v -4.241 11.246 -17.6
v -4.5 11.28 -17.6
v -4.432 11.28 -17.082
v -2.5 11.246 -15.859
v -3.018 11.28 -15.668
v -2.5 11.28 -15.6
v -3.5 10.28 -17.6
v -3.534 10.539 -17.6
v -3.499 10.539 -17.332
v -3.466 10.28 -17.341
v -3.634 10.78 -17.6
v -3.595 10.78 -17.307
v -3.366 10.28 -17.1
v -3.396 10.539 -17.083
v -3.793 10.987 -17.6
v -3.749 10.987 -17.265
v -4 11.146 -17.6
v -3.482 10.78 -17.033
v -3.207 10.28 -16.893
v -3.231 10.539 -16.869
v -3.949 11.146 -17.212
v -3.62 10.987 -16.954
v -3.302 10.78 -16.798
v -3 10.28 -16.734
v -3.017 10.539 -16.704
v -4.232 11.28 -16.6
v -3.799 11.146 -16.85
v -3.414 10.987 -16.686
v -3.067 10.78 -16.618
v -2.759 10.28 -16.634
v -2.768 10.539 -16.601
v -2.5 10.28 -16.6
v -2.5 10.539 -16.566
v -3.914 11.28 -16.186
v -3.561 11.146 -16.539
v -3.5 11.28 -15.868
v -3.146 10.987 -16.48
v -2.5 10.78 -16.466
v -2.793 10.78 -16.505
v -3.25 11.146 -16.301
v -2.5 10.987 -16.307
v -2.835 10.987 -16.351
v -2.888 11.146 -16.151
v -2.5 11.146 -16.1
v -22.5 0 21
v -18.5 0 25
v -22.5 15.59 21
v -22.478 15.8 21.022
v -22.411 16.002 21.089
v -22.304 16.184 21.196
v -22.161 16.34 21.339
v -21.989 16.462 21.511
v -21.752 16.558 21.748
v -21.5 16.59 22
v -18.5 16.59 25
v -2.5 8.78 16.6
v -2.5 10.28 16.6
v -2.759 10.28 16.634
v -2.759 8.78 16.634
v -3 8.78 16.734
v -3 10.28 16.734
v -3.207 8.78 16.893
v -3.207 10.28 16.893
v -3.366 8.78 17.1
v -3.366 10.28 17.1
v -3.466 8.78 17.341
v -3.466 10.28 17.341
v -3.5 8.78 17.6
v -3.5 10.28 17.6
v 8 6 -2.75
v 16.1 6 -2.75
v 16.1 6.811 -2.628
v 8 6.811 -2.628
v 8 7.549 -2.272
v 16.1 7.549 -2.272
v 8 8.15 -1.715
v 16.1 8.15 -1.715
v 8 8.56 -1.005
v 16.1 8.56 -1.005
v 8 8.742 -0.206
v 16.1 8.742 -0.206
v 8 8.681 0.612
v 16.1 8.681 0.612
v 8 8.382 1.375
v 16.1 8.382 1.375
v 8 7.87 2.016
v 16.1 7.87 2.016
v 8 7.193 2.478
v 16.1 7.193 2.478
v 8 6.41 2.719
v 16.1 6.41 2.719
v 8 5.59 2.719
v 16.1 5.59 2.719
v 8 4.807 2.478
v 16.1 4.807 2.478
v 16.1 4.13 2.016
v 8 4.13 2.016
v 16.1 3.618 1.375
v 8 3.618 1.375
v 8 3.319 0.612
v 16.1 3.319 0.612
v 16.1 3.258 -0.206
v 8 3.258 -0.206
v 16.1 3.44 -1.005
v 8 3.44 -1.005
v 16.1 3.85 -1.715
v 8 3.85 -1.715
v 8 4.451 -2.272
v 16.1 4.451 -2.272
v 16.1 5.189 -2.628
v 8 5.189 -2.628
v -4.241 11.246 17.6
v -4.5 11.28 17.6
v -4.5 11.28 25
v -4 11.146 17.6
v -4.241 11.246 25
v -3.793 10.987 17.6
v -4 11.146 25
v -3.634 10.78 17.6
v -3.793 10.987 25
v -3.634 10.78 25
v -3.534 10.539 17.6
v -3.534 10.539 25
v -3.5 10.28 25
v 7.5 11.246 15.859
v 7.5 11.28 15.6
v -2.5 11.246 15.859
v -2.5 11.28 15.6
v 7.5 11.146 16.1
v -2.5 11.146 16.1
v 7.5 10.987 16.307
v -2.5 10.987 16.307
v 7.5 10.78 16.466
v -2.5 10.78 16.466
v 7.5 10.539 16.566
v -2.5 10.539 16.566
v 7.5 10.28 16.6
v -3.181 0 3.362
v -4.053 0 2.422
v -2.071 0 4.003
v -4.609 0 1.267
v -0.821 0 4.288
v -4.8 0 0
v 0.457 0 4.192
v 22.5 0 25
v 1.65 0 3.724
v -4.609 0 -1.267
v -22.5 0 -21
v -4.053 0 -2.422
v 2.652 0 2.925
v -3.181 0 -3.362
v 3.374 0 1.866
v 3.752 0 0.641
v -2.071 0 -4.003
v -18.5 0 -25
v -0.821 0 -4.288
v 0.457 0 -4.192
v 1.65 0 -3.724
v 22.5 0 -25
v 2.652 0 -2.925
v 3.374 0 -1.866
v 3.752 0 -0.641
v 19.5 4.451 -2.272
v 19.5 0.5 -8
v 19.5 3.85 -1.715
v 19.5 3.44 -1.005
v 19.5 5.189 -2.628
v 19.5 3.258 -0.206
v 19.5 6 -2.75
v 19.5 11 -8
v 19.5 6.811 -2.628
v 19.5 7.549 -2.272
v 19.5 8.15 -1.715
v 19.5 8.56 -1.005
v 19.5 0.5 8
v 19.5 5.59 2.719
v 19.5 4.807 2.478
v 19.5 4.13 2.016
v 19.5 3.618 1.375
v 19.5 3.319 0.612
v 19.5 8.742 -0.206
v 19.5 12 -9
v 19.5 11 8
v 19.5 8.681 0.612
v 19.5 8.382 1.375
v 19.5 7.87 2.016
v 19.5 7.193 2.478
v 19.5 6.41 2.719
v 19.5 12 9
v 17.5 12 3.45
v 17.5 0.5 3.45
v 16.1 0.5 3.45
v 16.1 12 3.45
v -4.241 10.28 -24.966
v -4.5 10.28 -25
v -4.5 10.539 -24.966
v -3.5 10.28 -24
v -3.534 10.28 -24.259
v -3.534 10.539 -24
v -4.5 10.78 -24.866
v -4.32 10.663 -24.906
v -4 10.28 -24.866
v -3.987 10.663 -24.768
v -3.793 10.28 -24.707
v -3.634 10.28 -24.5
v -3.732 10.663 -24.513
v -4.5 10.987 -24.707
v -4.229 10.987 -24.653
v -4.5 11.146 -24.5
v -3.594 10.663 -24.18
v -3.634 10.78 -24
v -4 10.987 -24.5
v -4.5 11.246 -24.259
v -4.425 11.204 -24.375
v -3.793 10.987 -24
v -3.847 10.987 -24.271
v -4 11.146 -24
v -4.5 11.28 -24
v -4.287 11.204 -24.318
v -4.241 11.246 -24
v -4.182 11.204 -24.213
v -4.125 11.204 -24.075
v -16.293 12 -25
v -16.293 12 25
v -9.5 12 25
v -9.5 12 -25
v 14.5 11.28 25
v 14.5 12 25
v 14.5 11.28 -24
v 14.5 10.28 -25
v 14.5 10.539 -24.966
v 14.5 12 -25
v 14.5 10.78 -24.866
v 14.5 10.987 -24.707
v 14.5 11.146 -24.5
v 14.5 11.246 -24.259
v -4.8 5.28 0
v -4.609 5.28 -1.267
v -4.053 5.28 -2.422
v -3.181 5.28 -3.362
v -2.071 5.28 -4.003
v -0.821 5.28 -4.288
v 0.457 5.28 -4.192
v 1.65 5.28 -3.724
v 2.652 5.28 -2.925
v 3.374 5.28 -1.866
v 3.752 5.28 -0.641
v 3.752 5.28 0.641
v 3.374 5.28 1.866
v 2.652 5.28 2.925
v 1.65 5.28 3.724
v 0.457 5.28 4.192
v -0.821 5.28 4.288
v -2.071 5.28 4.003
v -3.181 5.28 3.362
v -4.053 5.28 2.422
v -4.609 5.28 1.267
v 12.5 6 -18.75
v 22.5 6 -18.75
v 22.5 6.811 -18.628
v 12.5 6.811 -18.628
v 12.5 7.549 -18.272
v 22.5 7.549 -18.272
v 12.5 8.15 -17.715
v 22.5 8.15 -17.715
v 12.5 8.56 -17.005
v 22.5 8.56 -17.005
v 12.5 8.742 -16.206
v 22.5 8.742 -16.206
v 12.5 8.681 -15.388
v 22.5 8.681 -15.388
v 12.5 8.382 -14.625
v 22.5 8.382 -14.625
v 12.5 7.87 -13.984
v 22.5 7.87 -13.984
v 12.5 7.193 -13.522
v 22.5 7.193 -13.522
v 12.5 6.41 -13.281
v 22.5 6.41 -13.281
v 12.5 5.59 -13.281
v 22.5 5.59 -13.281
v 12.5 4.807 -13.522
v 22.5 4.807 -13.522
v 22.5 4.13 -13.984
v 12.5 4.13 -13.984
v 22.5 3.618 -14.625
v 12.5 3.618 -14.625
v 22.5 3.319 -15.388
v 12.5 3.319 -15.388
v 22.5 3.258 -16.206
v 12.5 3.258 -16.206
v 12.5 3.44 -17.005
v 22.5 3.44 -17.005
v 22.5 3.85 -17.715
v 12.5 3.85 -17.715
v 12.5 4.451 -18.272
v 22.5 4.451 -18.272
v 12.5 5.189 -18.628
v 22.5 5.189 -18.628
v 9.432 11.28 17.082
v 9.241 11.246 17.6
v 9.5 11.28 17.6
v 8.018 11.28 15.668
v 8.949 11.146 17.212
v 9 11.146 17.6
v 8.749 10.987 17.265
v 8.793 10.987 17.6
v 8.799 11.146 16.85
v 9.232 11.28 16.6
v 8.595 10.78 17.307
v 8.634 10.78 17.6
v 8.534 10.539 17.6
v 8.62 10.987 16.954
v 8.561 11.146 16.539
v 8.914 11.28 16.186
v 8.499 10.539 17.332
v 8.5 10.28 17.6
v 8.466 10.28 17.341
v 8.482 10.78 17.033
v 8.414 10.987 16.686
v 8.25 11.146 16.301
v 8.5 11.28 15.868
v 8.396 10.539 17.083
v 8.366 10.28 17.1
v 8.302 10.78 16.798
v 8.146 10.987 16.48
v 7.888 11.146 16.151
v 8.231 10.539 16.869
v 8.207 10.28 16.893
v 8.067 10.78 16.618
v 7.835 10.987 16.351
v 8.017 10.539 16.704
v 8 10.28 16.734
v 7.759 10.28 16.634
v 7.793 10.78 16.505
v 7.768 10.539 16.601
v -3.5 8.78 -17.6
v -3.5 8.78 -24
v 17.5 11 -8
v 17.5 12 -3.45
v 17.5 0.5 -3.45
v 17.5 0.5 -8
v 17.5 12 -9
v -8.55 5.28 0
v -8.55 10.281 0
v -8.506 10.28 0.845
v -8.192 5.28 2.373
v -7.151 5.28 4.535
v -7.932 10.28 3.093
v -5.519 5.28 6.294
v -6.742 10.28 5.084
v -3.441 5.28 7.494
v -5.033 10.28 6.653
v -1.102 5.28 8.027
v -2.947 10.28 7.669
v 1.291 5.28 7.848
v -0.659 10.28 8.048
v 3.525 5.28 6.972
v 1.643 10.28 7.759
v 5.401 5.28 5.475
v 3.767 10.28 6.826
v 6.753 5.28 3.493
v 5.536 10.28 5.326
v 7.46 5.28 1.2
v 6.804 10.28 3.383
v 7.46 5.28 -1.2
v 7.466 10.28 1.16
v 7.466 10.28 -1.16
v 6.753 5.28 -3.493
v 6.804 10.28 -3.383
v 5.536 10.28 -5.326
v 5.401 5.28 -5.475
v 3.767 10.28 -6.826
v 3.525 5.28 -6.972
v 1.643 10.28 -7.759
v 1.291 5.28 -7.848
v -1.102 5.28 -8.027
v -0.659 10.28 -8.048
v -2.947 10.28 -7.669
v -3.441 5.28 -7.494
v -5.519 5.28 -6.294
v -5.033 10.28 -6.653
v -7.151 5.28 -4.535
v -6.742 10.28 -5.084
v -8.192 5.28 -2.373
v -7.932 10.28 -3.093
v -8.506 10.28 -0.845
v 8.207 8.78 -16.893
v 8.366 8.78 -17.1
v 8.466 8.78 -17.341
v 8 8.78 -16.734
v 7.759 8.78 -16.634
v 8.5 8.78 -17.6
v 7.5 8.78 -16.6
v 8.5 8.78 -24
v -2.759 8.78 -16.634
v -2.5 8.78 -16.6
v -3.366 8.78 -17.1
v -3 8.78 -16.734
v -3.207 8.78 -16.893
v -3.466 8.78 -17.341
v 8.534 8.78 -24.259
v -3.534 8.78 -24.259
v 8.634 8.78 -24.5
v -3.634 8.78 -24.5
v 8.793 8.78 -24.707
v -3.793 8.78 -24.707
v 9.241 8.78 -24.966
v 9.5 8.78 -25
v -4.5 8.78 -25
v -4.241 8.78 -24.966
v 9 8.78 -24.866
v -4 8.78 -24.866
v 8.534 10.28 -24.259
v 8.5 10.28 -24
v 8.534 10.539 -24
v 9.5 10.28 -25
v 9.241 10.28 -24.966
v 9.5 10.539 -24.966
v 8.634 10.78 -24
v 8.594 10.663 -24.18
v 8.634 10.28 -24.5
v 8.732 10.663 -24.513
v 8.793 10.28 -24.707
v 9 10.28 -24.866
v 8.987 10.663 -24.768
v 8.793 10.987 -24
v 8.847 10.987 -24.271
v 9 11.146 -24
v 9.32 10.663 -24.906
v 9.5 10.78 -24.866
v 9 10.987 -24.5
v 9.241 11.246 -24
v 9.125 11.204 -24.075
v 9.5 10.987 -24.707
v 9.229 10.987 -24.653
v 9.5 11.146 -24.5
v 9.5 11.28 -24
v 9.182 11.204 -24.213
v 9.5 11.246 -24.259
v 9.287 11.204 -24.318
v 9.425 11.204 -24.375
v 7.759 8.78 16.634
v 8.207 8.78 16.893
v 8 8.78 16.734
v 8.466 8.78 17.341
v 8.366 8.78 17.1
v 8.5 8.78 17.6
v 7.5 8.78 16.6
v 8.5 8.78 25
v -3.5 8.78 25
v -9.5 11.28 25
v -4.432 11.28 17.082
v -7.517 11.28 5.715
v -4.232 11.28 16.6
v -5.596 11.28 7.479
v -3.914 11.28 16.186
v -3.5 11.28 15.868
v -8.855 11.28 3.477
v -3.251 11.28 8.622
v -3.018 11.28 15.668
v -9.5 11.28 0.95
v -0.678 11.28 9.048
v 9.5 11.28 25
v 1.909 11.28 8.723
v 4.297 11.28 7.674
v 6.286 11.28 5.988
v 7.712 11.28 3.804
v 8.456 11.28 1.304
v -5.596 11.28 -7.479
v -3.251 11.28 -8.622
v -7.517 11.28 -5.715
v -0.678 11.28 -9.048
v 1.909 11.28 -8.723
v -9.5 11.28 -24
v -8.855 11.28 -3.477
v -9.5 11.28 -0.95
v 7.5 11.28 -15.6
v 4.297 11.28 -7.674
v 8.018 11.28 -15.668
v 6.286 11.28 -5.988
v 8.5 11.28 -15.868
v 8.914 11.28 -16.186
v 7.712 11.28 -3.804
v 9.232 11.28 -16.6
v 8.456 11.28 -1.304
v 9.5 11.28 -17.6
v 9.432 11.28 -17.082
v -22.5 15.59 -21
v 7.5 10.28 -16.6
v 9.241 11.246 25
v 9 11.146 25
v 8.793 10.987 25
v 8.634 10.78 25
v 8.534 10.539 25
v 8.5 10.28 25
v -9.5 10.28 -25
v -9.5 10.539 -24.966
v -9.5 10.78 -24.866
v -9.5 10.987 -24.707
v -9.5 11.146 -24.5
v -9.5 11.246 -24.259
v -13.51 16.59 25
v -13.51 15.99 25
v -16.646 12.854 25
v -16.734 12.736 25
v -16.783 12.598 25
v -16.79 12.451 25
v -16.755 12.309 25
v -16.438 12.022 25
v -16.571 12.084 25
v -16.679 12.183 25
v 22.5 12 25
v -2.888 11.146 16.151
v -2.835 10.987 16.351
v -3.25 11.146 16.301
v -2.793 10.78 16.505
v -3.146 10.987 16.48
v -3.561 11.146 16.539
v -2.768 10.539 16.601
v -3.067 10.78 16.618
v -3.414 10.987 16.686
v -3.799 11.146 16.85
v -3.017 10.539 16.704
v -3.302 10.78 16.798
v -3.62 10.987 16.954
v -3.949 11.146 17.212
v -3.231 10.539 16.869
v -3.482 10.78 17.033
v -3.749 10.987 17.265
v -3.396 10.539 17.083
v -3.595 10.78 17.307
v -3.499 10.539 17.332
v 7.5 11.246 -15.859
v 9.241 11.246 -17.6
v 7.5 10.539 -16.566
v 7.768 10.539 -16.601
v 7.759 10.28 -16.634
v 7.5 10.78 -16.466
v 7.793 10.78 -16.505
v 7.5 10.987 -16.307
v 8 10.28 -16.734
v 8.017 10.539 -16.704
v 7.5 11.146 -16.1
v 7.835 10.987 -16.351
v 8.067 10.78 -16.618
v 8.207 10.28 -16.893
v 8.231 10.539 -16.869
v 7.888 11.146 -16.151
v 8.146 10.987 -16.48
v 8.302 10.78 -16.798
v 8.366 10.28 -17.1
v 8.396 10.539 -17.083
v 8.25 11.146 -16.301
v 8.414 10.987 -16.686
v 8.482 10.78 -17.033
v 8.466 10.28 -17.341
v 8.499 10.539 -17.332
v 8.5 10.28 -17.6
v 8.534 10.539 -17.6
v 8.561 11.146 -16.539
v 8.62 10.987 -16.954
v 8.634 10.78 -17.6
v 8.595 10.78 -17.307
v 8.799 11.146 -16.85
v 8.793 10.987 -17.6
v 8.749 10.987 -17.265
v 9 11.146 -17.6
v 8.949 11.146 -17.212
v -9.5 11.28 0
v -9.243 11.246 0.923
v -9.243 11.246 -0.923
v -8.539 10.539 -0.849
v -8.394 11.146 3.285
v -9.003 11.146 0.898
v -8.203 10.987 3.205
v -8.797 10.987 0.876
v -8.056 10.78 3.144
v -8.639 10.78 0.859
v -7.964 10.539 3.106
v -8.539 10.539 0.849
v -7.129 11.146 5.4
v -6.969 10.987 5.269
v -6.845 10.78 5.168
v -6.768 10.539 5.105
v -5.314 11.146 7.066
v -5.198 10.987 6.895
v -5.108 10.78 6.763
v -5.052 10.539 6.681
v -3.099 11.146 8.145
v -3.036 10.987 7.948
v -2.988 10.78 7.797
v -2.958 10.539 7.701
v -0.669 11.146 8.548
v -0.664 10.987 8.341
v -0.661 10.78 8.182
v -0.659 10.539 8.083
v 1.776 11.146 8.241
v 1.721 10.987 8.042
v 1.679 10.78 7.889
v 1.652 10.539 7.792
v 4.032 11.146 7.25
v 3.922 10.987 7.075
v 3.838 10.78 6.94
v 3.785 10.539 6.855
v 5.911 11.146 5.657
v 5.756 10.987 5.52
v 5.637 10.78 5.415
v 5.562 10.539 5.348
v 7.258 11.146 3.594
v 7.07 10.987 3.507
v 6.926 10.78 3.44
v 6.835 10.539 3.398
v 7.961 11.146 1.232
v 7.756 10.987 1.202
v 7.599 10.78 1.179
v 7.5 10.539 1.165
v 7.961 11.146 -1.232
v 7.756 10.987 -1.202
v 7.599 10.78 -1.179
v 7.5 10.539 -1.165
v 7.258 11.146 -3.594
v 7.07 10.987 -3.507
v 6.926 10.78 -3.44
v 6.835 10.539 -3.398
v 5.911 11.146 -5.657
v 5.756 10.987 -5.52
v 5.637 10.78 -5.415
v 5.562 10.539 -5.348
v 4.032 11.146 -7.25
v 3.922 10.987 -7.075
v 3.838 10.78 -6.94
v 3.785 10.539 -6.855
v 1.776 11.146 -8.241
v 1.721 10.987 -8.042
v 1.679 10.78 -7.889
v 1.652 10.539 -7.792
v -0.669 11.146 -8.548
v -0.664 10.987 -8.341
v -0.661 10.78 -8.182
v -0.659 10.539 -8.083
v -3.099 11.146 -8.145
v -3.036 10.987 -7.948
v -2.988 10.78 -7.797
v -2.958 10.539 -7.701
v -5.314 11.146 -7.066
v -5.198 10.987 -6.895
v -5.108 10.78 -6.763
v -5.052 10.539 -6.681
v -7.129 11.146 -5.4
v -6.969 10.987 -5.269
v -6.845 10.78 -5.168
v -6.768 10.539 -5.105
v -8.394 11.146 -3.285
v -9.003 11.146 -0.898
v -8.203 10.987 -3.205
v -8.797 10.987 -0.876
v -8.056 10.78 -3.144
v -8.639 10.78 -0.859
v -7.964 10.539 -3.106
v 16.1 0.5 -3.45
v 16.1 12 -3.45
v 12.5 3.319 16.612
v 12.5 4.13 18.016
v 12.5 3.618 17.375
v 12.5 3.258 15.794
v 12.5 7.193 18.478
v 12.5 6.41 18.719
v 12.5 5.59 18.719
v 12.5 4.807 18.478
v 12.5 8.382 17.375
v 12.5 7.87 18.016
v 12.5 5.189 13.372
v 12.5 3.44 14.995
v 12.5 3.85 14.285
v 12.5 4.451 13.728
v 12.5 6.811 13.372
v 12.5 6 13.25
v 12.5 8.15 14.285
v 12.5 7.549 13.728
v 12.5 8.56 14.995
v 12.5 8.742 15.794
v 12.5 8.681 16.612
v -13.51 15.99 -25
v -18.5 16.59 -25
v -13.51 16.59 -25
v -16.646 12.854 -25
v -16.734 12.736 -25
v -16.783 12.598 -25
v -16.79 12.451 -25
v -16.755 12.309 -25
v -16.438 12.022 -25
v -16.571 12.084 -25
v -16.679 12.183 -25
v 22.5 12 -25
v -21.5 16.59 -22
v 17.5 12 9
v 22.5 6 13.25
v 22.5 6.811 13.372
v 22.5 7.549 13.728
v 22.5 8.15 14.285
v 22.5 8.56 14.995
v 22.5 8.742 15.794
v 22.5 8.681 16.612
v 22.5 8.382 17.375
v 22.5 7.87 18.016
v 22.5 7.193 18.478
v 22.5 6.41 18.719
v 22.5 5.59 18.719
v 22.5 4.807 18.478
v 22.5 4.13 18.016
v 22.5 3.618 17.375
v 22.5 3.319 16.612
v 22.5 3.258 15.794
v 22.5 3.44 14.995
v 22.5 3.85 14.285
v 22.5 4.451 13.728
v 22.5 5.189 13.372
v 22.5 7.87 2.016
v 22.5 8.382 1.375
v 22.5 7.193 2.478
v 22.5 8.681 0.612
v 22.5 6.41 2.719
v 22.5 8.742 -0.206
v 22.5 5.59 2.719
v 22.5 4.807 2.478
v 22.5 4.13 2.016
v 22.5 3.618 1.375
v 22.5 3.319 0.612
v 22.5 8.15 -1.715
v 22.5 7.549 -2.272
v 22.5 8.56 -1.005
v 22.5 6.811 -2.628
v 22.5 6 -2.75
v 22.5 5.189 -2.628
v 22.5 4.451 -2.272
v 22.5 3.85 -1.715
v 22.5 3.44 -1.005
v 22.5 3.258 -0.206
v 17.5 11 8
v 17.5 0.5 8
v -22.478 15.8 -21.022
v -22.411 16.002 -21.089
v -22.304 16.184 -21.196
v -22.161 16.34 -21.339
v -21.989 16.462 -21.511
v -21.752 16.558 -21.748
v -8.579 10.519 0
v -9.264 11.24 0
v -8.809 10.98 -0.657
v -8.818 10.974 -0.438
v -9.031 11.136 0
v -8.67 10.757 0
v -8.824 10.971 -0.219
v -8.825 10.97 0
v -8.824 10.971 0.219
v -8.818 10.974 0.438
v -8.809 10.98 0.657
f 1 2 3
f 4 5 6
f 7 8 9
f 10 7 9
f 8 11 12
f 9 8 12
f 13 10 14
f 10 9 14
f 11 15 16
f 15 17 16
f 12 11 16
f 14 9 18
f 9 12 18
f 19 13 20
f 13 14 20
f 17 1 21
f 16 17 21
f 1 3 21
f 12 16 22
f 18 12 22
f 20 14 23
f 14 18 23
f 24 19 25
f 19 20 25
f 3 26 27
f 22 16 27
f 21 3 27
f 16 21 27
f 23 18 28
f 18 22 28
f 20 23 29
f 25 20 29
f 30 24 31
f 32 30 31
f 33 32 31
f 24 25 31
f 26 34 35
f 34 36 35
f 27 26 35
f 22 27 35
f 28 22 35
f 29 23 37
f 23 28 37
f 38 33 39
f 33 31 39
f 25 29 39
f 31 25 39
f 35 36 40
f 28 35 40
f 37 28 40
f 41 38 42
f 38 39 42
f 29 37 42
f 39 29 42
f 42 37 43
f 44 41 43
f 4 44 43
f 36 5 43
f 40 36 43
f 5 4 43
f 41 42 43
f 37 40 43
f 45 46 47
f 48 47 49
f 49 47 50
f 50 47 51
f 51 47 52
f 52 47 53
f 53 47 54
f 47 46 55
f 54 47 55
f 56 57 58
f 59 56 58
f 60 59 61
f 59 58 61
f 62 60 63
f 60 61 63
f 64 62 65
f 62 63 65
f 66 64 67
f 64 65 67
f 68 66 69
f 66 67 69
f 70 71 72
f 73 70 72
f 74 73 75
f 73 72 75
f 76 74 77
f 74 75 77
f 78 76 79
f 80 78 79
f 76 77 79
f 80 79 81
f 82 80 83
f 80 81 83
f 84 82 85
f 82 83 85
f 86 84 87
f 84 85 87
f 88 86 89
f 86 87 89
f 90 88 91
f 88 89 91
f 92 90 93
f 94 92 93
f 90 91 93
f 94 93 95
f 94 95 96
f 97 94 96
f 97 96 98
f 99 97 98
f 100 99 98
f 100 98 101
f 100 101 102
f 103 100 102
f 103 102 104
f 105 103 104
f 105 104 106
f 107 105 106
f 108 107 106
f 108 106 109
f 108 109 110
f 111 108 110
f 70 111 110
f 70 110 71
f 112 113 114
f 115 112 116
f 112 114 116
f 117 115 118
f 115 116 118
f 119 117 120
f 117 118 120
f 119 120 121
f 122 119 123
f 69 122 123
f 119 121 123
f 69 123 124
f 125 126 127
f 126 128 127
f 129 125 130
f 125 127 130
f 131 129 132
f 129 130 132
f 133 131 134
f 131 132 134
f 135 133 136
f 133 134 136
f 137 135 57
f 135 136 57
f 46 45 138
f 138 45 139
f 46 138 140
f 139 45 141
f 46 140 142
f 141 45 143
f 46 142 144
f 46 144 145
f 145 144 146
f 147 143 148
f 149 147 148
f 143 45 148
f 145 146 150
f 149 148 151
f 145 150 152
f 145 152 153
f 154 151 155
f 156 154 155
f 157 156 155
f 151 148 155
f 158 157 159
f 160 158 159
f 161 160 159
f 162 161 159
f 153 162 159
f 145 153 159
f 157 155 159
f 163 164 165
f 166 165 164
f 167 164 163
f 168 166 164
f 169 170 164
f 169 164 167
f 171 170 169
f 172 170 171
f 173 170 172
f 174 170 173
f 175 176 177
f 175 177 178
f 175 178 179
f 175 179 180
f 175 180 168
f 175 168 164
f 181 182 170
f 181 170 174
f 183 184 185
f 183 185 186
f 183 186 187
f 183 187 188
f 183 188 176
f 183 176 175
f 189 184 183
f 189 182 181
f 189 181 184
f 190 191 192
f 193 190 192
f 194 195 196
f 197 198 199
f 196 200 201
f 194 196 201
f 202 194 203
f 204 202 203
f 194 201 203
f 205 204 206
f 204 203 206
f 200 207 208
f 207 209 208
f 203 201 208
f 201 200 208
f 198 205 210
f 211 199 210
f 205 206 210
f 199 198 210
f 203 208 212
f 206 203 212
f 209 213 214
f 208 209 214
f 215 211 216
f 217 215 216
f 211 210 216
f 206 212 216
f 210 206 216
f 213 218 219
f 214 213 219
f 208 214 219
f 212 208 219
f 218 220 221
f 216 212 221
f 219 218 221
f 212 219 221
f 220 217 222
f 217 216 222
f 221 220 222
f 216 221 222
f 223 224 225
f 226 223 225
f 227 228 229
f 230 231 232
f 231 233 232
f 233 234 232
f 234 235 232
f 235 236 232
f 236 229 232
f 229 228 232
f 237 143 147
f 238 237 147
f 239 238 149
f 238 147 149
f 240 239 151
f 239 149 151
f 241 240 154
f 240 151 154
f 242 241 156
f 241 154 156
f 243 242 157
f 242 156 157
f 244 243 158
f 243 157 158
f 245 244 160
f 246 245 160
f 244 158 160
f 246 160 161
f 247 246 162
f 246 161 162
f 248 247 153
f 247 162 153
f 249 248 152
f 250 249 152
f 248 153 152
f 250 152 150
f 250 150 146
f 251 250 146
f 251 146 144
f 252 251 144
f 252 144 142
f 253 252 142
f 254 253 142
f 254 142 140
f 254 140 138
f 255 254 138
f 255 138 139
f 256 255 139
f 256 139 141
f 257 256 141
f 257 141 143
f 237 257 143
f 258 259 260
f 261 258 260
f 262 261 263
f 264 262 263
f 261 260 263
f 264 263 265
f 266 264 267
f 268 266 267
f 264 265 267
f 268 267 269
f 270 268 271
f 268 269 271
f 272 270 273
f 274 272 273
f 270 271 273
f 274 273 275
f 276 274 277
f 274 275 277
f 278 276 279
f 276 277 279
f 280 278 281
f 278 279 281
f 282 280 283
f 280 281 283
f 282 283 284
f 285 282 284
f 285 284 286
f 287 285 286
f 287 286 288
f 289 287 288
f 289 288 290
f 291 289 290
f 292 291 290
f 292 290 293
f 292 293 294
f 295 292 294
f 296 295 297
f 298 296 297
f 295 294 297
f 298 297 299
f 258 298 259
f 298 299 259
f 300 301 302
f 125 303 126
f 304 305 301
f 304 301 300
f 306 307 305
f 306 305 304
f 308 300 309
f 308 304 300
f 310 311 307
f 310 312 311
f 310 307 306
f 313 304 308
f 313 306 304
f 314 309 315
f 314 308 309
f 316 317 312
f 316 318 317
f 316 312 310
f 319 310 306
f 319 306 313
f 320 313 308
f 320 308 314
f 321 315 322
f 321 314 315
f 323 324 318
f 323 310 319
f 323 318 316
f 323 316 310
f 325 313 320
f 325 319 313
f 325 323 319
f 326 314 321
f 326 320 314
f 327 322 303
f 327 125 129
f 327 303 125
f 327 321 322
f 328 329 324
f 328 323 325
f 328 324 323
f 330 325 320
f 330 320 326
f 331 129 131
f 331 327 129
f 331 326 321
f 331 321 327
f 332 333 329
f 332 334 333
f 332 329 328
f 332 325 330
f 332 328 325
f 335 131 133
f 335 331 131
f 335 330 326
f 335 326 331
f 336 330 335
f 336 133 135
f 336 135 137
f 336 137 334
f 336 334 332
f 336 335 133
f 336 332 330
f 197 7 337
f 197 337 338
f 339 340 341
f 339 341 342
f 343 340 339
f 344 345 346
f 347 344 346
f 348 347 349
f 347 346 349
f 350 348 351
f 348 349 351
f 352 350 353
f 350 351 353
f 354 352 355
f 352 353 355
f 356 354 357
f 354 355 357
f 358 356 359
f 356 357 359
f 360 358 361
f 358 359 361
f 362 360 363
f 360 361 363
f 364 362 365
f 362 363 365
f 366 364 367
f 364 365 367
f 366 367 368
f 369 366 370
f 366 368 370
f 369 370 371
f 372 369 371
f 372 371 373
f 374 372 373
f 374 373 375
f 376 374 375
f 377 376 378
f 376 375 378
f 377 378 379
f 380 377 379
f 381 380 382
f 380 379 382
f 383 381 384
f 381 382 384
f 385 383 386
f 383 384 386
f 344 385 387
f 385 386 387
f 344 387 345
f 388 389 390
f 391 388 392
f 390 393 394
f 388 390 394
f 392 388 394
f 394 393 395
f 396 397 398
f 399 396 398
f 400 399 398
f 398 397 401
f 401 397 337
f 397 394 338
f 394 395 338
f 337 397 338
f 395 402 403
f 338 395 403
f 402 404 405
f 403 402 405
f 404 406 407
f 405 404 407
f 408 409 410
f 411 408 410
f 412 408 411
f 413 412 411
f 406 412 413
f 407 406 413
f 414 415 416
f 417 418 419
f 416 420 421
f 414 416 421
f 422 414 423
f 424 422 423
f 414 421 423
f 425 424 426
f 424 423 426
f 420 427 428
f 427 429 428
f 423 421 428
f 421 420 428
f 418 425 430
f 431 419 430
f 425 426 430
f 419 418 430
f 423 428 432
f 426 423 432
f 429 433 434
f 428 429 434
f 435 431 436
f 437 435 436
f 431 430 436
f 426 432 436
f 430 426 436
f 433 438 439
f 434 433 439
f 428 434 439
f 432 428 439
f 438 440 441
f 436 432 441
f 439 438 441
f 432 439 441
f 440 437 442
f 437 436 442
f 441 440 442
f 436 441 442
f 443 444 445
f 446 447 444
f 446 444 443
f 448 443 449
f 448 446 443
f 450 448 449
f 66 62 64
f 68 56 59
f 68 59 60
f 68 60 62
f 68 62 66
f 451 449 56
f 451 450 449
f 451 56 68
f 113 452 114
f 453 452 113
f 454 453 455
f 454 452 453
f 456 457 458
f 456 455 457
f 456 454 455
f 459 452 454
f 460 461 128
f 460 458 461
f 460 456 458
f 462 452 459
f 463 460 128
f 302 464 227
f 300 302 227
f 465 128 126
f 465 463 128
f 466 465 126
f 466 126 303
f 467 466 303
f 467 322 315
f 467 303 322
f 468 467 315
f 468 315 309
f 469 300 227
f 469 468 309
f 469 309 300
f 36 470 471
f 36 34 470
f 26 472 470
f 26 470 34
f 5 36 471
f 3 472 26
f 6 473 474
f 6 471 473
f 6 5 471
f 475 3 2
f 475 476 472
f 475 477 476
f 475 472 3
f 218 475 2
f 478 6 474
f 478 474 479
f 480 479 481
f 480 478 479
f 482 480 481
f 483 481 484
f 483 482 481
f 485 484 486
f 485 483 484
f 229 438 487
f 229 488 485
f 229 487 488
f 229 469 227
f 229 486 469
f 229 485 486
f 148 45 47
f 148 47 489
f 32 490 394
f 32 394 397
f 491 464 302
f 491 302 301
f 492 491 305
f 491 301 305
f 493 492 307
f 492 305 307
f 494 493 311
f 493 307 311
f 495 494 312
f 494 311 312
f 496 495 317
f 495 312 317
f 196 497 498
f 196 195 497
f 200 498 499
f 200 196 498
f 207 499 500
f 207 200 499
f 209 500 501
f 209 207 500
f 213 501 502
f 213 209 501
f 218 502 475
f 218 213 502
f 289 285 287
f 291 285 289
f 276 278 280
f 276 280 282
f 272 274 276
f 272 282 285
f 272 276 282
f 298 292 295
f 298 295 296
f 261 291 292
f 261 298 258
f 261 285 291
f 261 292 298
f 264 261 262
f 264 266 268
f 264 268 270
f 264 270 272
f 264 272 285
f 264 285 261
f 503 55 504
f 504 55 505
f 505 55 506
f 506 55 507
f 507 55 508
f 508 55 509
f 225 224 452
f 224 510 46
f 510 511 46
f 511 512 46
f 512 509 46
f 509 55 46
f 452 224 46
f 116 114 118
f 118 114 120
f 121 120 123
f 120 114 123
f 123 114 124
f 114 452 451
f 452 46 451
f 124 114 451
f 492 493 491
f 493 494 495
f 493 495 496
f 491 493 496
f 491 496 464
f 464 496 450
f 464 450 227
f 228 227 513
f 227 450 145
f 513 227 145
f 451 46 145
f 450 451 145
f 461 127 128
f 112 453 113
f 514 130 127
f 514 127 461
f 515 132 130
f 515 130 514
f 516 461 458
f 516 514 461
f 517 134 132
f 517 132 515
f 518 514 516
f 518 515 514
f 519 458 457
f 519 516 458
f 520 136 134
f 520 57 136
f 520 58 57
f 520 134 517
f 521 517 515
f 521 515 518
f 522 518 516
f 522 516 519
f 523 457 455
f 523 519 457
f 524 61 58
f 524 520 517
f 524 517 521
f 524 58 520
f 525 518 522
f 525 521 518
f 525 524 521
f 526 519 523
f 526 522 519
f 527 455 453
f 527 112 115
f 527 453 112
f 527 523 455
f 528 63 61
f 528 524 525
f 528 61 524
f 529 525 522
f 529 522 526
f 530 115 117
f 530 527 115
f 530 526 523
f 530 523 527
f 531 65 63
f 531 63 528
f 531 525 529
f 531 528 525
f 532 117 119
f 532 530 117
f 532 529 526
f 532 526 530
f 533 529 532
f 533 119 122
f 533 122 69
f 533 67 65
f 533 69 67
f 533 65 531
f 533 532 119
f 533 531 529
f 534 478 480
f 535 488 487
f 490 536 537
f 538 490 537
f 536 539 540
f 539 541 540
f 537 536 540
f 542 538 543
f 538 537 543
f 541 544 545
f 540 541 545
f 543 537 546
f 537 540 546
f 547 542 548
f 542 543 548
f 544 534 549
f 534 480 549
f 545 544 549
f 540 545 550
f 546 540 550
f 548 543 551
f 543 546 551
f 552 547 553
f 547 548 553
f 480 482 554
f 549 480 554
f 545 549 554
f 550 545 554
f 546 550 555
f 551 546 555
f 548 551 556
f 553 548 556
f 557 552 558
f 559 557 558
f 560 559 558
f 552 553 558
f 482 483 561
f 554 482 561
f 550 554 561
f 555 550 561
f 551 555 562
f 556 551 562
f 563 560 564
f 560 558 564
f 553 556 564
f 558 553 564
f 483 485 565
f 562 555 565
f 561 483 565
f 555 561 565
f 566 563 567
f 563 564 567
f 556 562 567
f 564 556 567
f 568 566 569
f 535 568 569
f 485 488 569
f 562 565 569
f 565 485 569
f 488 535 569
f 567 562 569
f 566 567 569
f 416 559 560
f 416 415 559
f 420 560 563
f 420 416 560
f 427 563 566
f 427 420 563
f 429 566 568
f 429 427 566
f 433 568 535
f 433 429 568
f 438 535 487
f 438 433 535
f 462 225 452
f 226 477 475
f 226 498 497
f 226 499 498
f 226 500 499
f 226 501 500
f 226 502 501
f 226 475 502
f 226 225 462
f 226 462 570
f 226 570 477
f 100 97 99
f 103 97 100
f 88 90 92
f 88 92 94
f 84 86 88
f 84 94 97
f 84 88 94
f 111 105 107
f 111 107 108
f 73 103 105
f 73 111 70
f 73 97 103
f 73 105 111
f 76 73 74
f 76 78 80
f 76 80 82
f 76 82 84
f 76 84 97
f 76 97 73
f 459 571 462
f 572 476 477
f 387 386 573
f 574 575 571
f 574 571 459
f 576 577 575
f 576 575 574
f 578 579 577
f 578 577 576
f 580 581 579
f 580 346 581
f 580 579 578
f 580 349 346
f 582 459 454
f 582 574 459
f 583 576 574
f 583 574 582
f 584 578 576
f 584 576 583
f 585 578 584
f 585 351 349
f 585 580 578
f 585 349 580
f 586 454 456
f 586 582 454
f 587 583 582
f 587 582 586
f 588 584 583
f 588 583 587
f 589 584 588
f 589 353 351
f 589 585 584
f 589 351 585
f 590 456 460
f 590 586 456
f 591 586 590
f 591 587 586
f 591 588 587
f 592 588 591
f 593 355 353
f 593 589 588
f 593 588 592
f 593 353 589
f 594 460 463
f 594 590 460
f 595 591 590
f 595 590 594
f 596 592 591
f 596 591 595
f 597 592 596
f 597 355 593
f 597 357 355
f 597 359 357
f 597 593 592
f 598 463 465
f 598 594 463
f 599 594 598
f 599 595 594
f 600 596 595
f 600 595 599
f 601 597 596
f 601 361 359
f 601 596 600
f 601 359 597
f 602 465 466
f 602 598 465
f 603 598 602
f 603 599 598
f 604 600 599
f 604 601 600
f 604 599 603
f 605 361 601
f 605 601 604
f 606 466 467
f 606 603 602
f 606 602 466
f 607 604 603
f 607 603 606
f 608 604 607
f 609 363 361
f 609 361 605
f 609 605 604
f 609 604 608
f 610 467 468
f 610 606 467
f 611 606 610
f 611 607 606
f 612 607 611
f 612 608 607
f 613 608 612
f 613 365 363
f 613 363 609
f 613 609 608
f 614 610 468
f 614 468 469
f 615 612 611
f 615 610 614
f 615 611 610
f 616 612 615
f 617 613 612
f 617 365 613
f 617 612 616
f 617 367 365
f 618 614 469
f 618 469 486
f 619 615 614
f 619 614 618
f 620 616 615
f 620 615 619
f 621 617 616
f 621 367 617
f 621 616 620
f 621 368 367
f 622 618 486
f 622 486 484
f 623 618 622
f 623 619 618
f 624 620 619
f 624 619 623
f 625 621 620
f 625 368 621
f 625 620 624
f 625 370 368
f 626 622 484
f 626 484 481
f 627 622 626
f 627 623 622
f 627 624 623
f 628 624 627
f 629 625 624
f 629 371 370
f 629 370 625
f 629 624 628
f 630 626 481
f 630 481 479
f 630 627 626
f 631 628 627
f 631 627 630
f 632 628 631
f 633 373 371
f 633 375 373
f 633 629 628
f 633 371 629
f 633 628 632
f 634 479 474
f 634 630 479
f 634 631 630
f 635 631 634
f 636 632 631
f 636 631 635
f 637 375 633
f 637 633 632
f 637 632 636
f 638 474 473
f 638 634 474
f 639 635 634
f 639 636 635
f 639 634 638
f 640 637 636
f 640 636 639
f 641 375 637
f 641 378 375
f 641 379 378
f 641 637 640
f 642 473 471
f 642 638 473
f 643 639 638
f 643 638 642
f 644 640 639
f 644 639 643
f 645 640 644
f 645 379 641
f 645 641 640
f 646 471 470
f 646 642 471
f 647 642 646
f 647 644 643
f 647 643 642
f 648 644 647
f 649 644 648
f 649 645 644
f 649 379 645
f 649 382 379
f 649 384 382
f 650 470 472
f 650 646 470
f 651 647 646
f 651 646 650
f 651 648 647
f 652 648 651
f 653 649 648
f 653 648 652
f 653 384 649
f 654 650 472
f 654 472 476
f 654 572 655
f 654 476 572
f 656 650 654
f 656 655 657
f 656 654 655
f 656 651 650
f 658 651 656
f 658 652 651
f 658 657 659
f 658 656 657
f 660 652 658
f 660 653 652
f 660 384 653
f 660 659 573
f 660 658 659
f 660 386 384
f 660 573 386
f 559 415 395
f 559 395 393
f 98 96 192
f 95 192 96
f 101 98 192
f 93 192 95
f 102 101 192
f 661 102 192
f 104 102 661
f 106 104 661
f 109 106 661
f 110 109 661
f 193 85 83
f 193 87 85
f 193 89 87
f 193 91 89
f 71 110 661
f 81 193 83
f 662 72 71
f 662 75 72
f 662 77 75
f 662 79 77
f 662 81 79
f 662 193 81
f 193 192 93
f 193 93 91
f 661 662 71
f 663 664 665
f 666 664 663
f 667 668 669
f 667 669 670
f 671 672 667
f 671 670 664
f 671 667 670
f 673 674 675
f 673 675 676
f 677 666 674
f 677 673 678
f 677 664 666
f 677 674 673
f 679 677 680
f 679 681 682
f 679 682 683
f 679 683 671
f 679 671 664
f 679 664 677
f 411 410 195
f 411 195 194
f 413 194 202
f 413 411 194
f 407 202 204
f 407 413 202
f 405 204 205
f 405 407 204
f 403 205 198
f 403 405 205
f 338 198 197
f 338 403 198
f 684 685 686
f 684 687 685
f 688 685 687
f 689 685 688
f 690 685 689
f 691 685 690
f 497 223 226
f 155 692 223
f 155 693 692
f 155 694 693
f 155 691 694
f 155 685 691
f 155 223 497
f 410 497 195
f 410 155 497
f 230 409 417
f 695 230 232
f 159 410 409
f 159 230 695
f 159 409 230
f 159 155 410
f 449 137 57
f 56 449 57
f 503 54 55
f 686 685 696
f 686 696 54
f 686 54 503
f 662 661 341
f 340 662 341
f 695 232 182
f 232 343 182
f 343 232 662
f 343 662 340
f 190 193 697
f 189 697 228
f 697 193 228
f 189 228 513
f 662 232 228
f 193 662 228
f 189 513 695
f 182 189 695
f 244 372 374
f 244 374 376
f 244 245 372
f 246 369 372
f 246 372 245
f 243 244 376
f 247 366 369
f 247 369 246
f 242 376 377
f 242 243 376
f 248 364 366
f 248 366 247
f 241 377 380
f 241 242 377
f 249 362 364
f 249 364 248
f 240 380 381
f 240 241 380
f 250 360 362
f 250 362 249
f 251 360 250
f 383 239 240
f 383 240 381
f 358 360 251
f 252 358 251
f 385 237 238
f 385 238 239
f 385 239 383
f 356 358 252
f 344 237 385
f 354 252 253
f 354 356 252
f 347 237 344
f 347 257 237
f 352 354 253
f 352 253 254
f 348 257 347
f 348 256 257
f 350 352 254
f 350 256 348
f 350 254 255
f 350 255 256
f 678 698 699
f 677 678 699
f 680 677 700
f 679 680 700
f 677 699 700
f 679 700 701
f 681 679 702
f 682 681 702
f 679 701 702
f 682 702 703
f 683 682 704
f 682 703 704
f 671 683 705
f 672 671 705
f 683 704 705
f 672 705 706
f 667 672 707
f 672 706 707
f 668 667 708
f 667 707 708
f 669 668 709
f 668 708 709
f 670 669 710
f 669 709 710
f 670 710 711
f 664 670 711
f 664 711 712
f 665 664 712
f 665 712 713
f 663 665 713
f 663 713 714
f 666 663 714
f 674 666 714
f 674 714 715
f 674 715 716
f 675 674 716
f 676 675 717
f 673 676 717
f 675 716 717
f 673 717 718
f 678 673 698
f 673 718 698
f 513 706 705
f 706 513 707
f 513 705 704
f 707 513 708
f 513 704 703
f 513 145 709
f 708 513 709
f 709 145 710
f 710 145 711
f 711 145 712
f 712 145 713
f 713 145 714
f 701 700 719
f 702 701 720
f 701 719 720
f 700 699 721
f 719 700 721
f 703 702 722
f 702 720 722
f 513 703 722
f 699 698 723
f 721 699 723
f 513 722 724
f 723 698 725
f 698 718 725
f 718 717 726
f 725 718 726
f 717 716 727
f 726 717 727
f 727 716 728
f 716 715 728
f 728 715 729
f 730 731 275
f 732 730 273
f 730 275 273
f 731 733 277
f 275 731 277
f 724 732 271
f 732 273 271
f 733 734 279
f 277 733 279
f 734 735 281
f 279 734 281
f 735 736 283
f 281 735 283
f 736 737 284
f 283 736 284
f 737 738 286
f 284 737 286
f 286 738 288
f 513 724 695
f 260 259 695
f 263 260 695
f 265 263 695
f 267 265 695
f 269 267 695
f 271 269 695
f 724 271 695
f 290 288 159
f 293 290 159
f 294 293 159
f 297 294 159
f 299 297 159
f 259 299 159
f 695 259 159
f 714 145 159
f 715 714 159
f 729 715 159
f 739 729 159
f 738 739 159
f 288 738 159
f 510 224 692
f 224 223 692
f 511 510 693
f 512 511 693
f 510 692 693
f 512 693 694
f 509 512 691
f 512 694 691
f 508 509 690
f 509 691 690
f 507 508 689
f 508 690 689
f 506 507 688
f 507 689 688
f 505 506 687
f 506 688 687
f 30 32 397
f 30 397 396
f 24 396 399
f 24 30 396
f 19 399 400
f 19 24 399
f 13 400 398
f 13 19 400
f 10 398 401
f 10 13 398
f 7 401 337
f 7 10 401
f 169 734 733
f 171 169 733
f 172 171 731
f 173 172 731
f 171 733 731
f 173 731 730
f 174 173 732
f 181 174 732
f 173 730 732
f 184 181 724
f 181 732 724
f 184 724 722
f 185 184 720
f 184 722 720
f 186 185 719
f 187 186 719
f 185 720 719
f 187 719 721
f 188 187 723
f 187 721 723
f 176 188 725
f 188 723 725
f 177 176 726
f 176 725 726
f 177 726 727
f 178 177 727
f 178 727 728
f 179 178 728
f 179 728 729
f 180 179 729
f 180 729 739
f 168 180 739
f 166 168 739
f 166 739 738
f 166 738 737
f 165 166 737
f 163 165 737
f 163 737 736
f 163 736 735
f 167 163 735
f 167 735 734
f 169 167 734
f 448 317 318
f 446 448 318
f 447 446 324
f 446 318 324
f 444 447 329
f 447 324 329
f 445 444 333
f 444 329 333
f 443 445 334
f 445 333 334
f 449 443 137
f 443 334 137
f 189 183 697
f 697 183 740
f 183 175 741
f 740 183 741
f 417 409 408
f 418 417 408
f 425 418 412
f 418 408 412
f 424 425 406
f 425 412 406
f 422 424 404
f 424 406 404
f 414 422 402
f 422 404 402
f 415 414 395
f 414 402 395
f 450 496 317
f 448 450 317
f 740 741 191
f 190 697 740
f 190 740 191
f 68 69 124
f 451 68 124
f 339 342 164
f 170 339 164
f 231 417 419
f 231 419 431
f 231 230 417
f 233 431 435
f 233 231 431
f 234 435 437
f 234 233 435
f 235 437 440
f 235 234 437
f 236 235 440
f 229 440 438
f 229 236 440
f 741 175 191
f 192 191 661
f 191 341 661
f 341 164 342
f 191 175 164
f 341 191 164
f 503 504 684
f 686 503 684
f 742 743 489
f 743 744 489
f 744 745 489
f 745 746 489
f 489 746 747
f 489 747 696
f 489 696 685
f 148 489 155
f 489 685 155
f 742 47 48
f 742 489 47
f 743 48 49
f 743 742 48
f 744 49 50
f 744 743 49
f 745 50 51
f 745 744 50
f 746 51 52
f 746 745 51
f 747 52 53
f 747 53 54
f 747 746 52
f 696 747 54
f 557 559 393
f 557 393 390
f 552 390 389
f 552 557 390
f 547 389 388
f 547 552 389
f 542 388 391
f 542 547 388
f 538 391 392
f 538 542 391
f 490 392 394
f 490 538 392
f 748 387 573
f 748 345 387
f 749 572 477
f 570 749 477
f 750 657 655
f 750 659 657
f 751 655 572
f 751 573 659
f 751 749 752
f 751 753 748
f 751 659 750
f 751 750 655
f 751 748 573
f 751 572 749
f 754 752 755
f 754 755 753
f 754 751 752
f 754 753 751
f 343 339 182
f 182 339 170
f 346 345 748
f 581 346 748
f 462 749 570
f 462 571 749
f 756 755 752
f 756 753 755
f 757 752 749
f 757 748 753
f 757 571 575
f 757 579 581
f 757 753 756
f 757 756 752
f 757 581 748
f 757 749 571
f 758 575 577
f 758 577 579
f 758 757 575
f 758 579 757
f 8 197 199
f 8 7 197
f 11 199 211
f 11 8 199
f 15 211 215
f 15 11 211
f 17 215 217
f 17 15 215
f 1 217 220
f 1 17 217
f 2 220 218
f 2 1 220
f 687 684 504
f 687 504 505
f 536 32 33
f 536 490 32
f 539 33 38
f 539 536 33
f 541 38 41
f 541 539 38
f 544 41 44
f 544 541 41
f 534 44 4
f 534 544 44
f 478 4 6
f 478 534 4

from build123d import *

# Parameters (mm, degrees)
SKETCH1_W            = 45
SKETCH1_H            = 50
BOSS_EXTRUDE1_DEPTH  = 16
CUT_EXTRUDE1_DEPTH   = 58.116109812
SKETCH4_W            = 24
SKETCH4_H            = 50
CUT_EXTRUDE2_DEPTH   = 0.72
CUT_EXTRUDE3_DEPTH   = 58.116109812
SKETCH8_R            = 8.05
CUT_EXTRUDE4_DEPTH   = 6
M8_CLEARANCE_HOLE1_D = 8.6
CUT_EXTRUDE5_DEPTH   = 2.5
FILLET1_R            = 1
FILLET2_R            = 1
FILLET4_R            = 0.5
CUT_EXTRUDE7_DEPTH   = 11.5
SKETCH18_R           = 2.75
CUT_EXTRUDE8_DEPTH   = 14.5
SKETCH19_R           = 2.75
CUT_EXTRUDE9_DEPTH   = 10
SKETCH21_W           = 8.99
SKETCH21_H           = 50
BOSS_EXTRUDE2_DEPTH  = 0.6
CHAMFER1_SIZE        = 4
FILLET5_R            = 1
CHAMFER2_SIZE        = 1


with BuildPart() as part:
    # Sketch1 → Boss-Extrude1 (new body)
    with BuildSketch(Plane(origin=(0, 0, 0), x_dir=(1, 0, 0), z_dir=(0, 1, 0))):
        Rectangle(SKETCH1_W, SKETCH1_H)
    extrude(amount=BOSS_EXTRUDE1_DEPTH)

    # Sketch3 → Cut-Extrude1 (cut, through all)
    with BuildSketch(Plane.XY.offset(25)):
        Polygon((-13.5, 16), (-17.5, 12), (22.5, 12), (22.5, 16), align=None)
    extrude(amount=-CUT_EXTRUDE1_DEPTH, mode=Mode.SUBTRACT)

    # Sketch4 → Cut-Extrude2 (cut)
    with BuildSketch(Plane(origin=(0, 12, 0), x_dir=(1, 0, 0), z_dir=(0, 1, 0))):
        with Locations((2.5, 0)):
            Rectangle(SKETCH4_W, SKETCH4_H)
    extrude(amount=-CUT_EXTRUDE2_DEPTH, mode=Mode.SUBTRACT)

    # Sketch5 → Cut-Extrude3 (cut, through all)
    with BuildSketch(Plane.XY.offset(25)):
        Polygon((-22.5, 16), (-13.5, 16), (-13.51, 15.99), (-22.5, 15.99), align=None)
    extrude(amount=-CUT_EXTRUDE3_DEPTH, mode=Mode.SUBTRACT)

    # Sketch8 → Cut-Extrude4 (cut)
    with BuildSketch(Plane(origin=(0, 11.28, 0), x_dir=(1, 0, 0), z_dir=(0, 1, 0))):
        with Locations(Location((-0.5, 0, 0), (0, 0, 180))):
            Circle(SKETCH8_R)
    extrude(amount=-CUT_EXTRUDE4_DEPTH, mode=Mode.SUBTRACT)

    # M8 Clearance Hole1 (through all)
    with Locations(Plane(origin=(0, 5.28, 0), x_dir=(1, 0, 0), z_dir=(0, 1, 0))):
        with Locations((-0.5, 0)):
            Hole(M8_CLEARANCE_HOLE1_D / 2)

    # Sketch12 → Cut-Extrude5 (cut)
    with BuildSketch(Plane(origin=(0, 11.28, 0), x_dir=(1, 0, 0), z_dir=(0, 1, 0))):
        with BuildLine():
            Line((7.5, 16.6), (-2.5, 16.6))
            ThreePointArc((-2.5, 16.6), (-3.207106781, 16.892893219), (-3.5, 17.6))
            Line((-3.5, 17.6), (-3.5, 25))
            Line((-3.5, 25), (8.5, 25))
            Line((8.5, 25), (8.5, 17.6))
            ThreePointArc((8.5, 17.6), (8.207106781, 16.892893219), (7.5, 16.6))
        make_face()
    cut_extrude5 = extrude(amount=-CUT_EXTRUDE5_DEPTH, mode=Mode.SUBTRACT)

    # Fillet1
    fillet1_edges = [part.edges().sort_by_distance(p)[0] for p in [
        (-3.5, 10.03, -25),
        (8.5, 10.03, -25),
    ]]
    fillet(fillet1_edges, radius=FILLET1_R)

    # Mirror2: Cut-Extrude5 across plane
    add(cut_extrude5.mirror(Plane.XY), mode=Mode.SUBTRACT)

    # Fillet2
    fillet2_edges = [part.edges().sort_by_distance(p)[0] for p in [
        (8.207106781, 11.28, 16.892893219),
        (8.5, 11.28, 21.3),
        (-3.5, 11.28, 21.3),
        (-3.207106781, 11.28, 16.892893219),
        (2.5, 11.28, 16.6),
        (-7, 11.28, -25),
        (7.55, 11.28, 0),
        (8.207106781, 11.28, -16.892893219),
        (8.5, 11.28, -20.8),
        (-3.207106781, 11.28, -16.892893219),
        (2.5, 11.28, -16.6),
        (12, 11.28, -25),
        (-3.5, 11.28, -20.8),
        (-3.792893219, 11.28, -24.707106781),
        (8.792893219, 11.28, -24.707106781),
    ]]
    fillet(fillet2_edges, radius=FILLET2_R)

    # Fillet4
    fillet4_edges = [part.edges().sort_by_distance(p)[0] for p in [
        (-17.5, 12, 0),
    ]]
    fillet(fillet4_edges, radius=FILLET4_R)

    # Sketch14 → Cut-Extrude7 (cut)
    with BuildSketch(Plane(origin=(0, 12, 0), x_dir=(1, 0, 0), z_dir=(0, 1, 0))):
        Polygon((19.5, -8), (17.5, -8), (17.5, -3.45), (16.1, -3.45), (16.1, 3.45), (17.5, 3.45), (17.5, 8), (19.5, 8), align=None)
    extrude(amount=-CUT_EXTRUDE7_DEPTH, mode=Mode.SUBTRACT)

    # Sketch18 → Cut-Extrude8 (cut)
    with BuildSketch(Plane(origin=(22.5, 0, 0), x_dir=(0, 0, -1), z_dir=(1, 0, 0))):
        with Locations((0, 6)):
            Circle(SKETCH18_R)
    extrude(amount=-CUT_EXTRUDE8_DEPTH, mode=Mode.SUBTRACT)

    # Sketch19 → Cut-Extrude9 (cut)
    with BuildSketch(Plane(origin=(22.5, 0, 0), x_dir=(0, 0, -1), z_dir=(1, 0, 0))):
        with Locations((-16, 6)):
            Circle(SKETCH19_R)
        with Locations((16, 6)):
            Circle(SKETCH19_R)
    extrude(amount=-CUT_EXTRUDE9_DEPTH, mode=Mode.SUBTRACT)

    # Sketch21 → Boss-Extrude2 (add)
    with BuildSketch(Plane(origin=(0, 15.99, 0), x_dir=(1, 0, 0), z_dir=(0, 1, 0))):
        with Locations((-18.005, 0)):
            Rectangle(SKETCH21_W, SKETCH21_H)
    extrude(amount=BOSS_EXTRUDE2_DEPTH)

    # Chamfer1
    chamfer1_edges = [part.edges().sort_by_distance(p)[0] for p in [
        (-22.5, 8.295, 25),
        (-22.5, 8.295, -25),
    ]]
    chamfer(chamfer1_edges, length=CHAMFER1_SIZE)

    # Fillet5
    fillet5_edges = [part.edges().sort_by_distance(p)[0] for p in [
        (-22.5, 16.59, 0),
    ]]
    fillet(fillet5_edges, radius=FILLET5_R)

    # Chamfer2
    chamfer2_edges = [part.edges().sort_by_distance(p)[0] for p in [
        (18.5, 12, 8),
        (18.5, 12, -8),
    ]]
    chamfer(chamfer2_edges, length=CHAMFER2_SIZE)


solid = part.part
